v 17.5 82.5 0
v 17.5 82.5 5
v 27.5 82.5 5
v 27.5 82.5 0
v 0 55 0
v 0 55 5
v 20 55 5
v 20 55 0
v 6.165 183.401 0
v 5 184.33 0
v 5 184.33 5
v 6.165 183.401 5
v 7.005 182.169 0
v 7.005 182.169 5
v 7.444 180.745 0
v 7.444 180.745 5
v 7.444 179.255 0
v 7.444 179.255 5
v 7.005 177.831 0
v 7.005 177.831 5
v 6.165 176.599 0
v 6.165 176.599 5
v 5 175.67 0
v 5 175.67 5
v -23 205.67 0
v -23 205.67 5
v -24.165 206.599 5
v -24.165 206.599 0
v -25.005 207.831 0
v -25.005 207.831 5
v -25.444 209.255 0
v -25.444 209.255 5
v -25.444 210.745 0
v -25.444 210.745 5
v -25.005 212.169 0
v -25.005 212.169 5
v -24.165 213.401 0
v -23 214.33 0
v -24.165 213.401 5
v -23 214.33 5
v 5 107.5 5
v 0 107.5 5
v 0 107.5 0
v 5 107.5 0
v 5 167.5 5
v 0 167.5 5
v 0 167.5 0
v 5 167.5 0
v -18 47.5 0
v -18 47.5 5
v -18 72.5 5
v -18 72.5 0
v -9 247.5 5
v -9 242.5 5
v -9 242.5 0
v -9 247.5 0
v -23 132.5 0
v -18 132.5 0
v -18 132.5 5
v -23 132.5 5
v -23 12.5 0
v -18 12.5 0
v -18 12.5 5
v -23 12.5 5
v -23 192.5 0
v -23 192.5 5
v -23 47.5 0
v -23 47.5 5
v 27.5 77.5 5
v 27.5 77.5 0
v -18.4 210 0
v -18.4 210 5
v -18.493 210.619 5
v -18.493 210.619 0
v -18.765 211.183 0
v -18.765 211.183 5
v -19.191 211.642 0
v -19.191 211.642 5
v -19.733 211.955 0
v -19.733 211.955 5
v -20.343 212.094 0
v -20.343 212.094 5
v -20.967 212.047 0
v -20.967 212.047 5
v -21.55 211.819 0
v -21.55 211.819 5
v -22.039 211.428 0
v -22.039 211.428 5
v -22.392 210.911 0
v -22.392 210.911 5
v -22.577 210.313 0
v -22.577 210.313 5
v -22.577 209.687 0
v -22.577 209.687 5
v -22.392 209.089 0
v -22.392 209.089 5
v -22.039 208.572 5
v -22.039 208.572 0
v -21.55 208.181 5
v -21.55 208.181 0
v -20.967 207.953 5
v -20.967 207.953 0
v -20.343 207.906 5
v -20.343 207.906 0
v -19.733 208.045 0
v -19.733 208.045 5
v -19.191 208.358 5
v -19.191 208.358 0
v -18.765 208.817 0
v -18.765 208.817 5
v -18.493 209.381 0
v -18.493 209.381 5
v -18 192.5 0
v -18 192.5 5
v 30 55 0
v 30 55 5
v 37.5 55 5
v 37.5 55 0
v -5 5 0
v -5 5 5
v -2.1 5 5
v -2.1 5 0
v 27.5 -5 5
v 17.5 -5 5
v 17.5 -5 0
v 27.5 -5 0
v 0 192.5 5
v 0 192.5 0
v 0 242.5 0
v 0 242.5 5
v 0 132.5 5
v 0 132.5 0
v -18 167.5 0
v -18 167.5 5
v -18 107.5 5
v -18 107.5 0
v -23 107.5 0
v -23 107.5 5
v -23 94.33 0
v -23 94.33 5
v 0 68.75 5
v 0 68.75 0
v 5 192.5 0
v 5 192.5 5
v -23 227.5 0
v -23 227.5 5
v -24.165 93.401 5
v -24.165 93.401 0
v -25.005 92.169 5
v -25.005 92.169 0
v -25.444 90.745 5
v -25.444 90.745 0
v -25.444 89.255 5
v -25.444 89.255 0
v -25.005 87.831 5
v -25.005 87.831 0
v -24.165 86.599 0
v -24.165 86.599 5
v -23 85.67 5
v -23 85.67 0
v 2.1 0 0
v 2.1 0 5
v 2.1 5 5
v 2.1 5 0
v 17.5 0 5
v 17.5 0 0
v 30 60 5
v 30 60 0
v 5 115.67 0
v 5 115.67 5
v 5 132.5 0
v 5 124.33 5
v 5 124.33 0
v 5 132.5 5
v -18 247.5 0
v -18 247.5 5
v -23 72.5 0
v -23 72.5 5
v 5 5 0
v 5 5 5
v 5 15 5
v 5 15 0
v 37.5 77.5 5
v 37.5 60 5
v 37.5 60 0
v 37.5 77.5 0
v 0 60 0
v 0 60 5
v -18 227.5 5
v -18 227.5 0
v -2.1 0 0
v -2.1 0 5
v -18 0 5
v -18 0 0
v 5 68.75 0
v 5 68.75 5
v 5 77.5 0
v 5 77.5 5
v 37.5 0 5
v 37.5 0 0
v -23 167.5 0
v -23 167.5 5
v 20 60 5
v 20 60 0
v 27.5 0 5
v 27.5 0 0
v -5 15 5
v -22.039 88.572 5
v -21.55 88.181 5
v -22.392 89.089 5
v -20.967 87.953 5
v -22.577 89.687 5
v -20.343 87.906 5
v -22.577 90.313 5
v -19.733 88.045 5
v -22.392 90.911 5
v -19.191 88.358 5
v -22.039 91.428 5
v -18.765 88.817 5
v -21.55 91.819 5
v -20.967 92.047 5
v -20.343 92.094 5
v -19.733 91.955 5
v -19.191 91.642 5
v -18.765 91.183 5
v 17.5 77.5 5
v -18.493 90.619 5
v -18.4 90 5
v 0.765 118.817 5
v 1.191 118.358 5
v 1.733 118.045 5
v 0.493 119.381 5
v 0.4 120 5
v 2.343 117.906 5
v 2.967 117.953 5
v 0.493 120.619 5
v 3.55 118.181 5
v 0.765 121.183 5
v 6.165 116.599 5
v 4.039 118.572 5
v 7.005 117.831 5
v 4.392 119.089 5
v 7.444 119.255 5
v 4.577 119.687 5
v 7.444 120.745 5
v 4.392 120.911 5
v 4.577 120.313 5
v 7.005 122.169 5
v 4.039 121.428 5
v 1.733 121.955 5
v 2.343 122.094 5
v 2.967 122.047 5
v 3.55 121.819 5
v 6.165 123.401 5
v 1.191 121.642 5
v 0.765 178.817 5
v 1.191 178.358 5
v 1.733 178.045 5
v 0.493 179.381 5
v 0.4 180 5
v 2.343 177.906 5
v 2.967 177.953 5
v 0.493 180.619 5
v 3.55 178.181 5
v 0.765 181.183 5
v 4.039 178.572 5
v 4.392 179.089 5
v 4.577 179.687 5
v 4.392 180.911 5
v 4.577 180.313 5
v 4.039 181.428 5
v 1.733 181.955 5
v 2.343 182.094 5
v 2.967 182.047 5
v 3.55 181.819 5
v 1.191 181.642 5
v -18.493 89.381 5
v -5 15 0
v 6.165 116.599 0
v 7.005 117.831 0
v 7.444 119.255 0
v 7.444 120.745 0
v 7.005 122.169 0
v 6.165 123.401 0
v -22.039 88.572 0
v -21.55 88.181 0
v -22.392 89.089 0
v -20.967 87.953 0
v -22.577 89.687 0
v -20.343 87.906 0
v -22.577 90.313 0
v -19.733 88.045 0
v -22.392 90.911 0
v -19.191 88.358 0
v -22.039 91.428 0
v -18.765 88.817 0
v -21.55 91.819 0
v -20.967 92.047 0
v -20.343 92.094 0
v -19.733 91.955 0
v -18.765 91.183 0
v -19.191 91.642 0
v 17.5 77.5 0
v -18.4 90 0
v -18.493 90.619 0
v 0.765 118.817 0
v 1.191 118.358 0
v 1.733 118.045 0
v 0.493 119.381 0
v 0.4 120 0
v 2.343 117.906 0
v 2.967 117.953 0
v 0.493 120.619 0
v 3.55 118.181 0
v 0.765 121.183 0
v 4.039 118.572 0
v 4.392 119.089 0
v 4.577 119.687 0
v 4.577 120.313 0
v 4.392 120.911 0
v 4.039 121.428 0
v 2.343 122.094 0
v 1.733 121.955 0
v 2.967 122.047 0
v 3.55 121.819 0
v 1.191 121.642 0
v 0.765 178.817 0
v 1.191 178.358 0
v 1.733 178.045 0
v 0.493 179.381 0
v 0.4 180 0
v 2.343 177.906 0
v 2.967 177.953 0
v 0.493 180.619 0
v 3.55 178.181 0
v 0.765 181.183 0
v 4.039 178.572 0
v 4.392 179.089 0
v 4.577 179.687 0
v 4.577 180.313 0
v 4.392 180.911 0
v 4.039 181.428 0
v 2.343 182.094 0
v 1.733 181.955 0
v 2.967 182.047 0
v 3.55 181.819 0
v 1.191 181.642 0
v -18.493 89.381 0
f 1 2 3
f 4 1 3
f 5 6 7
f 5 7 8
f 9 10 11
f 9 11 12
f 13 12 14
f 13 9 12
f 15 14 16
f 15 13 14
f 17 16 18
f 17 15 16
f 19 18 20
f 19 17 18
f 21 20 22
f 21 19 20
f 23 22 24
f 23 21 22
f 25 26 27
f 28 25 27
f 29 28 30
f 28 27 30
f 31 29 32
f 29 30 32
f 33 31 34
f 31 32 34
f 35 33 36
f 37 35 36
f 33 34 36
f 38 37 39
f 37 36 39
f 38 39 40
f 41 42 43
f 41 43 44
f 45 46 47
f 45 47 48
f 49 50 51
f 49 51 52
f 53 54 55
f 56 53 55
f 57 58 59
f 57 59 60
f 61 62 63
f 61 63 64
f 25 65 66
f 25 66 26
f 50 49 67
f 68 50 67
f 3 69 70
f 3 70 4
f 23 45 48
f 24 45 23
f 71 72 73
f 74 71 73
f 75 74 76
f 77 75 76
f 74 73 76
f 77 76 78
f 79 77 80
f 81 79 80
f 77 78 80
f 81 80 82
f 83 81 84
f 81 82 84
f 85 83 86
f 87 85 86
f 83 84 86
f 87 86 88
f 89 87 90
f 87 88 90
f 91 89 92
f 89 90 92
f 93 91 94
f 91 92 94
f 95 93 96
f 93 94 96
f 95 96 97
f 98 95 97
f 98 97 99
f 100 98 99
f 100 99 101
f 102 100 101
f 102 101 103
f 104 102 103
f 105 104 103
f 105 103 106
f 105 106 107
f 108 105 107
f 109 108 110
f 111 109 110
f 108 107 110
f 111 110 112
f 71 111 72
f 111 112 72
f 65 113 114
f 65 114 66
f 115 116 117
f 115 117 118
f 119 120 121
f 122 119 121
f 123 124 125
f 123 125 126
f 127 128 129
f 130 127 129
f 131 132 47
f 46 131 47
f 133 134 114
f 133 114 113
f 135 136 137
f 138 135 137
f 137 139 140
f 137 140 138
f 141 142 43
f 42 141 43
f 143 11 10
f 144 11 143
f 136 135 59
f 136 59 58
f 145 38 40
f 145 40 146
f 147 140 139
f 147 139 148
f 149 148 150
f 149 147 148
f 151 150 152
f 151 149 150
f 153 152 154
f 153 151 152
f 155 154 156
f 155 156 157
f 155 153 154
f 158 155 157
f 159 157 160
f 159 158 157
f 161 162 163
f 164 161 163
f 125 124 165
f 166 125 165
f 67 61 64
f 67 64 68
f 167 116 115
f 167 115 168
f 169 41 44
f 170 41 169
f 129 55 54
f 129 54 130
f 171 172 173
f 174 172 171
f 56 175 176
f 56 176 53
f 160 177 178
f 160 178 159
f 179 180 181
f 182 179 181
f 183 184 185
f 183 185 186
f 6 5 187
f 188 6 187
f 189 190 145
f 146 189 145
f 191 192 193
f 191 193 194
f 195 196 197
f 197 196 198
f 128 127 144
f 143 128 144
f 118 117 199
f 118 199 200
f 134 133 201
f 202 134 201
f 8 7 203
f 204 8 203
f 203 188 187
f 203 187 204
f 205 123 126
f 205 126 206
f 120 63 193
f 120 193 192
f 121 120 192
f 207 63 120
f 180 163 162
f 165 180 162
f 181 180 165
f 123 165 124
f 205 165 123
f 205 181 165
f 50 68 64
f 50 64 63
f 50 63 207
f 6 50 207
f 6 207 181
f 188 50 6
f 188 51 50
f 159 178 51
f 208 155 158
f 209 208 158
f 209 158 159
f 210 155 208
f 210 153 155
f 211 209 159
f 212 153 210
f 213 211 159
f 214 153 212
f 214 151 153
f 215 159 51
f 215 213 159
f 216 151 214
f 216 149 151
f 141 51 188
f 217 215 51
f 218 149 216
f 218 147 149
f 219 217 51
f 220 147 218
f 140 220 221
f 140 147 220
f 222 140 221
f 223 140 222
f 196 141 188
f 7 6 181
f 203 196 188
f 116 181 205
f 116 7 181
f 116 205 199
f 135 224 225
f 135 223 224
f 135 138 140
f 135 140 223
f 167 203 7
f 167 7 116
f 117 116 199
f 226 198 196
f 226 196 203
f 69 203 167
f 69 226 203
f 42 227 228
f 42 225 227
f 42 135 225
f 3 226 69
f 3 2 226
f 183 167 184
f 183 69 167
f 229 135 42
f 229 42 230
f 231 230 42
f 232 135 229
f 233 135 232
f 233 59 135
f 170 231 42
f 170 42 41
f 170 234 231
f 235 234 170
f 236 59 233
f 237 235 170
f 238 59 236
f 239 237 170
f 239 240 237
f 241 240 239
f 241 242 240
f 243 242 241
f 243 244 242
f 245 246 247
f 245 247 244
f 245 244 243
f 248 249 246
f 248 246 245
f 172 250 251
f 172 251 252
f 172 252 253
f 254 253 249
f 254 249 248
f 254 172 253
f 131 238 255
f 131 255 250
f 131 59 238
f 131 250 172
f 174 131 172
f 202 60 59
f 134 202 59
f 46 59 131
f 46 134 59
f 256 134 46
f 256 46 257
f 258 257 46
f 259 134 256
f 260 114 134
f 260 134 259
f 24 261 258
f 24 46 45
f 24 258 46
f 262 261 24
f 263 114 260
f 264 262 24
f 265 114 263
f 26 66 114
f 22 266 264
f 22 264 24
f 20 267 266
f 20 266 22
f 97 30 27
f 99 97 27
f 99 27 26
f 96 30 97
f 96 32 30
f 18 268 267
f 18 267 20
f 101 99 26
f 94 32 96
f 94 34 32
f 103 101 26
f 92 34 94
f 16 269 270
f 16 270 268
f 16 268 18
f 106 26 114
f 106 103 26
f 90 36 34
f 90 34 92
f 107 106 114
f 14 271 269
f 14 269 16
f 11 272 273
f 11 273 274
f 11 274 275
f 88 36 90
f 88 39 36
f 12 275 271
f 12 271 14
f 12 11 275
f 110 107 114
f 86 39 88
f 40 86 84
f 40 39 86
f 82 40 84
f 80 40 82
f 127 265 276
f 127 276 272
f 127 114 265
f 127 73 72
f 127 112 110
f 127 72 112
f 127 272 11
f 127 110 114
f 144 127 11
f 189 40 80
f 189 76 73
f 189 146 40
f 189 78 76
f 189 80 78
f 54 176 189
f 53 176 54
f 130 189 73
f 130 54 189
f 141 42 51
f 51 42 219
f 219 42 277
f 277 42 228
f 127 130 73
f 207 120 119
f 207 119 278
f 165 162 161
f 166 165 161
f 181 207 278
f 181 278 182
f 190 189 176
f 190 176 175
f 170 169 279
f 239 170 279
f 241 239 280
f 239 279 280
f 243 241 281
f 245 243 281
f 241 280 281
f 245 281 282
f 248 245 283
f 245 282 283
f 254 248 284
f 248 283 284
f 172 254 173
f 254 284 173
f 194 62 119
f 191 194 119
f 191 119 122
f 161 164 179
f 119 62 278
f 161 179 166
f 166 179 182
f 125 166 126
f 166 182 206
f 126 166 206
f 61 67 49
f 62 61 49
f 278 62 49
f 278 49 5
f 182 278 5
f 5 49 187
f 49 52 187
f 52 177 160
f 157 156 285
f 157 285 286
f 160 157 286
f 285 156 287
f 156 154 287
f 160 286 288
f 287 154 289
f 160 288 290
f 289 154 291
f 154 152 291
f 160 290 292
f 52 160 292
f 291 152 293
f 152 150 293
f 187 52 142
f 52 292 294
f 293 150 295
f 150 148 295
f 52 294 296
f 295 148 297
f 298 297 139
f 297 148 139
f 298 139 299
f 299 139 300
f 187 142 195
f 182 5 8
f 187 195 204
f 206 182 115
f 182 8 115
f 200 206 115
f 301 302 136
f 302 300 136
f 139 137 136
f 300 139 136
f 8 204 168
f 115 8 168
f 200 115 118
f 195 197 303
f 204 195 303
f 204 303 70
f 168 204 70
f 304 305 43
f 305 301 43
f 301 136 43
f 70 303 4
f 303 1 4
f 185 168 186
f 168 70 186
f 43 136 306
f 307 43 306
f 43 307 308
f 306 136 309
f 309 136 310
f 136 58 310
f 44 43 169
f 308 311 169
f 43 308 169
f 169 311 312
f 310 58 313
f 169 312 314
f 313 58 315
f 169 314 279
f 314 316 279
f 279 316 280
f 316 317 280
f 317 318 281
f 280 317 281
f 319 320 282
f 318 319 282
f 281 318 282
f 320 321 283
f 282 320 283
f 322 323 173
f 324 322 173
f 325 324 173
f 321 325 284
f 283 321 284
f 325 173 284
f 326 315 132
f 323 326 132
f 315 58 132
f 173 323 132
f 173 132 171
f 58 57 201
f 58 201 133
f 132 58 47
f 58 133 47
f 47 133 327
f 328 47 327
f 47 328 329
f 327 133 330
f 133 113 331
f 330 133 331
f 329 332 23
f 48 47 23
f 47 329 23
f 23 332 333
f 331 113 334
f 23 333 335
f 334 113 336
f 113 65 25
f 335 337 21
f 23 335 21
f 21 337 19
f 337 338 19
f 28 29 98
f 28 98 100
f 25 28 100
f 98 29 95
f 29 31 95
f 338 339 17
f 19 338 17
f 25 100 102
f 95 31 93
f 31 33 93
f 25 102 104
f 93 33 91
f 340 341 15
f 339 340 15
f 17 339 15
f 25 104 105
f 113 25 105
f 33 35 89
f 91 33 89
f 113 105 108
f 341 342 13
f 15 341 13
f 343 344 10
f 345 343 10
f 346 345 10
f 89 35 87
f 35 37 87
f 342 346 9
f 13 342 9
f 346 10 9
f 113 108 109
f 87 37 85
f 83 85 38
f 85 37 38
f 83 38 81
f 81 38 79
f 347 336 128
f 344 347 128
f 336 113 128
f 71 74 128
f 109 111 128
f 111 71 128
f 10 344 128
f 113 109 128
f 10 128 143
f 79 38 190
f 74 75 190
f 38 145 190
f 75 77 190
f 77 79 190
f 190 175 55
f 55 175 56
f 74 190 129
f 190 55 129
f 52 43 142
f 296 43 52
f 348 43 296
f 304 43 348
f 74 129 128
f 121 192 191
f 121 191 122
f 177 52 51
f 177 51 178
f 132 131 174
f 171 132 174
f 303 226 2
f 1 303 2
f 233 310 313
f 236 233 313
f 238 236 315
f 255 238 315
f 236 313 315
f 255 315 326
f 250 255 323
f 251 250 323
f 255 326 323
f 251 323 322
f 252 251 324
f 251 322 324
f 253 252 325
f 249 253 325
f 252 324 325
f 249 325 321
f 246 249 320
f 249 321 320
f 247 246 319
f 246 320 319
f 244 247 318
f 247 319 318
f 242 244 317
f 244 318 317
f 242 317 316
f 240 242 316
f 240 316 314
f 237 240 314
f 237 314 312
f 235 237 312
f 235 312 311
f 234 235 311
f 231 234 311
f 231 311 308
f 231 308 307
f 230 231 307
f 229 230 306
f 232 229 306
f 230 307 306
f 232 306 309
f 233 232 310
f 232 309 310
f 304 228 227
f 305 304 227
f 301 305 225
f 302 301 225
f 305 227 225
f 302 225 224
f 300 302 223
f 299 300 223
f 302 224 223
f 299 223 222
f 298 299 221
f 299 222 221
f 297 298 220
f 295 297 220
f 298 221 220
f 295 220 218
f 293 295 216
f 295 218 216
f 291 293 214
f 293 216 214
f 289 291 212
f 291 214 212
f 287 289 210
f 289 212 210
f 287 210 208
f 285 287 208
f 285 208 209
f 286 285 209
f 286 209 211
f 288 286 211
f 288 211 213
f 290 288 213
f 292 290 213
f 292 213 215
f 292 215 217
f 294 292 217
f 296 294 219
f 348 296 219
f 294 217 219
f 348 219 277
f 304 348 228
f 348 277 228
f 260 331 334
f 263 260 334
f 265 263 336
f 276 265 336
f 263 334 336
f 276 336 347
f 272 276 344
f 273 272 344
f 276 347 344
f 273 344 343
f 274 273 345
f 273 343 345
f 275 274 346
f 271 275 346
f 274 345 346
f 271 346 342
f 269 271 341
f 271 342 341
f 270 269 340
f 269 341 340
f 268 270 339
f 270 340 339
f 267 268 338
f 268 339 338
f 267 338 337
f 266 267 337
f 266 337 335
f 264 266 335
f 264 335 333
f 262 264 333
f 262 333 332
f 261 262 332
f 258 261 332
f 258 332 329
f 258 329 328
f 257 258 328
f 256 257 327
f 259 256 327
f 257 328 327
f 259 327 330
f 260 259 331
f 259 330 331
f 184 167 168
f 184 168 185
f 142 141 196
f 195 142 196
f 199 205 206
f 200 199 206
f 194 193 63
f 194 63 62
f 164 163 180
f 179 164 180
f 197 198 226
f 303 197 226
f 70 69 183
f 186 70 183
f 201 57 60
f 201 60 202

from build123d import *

# Parameters (mm, degrees)
SKETCH1_W            = 18
SKETCH1_H            = 242.5
BOSS_EXTRUDE2_DEPTH  = 5
SKETCH2_W            = 9
SKETCH2_H            = 5
BOSS_EXTRUDE3_DEPTH  = 5
SKETCH3_W            = 5
SKETCH3_H            = 35
BOSS_EXTRUDE4_DEPTH  = 5
SKETCH4_W            = 5
SKETCH4_H            = 25
BOSS_EXTRUDE5_DEPTH  = 5
SKETCH5_W            = 5
SKETCH5_H            = 55
BOSS_EXTRUDE6_DEPTH  = 37.5
SKETCH6_W            = 10
SKETCH6_H            = 5
BOSS_EXTRUDE7_DEPTH  = 5
SKETCH7_W            = 5
SKETCH7_H            = 8.75
BOSS_EXTRUDE8_DEPTH  = 5
SKETCH8_W            = 10
SKETCH8_H            = 5
BOSS_EXTRUDE9_DEPTH  = 5
SKETCH9_W            = 32.5
SKETCH9_H            = 17.5
BOSS_EXTRUDE10_DEPTH = 5
SKETCH10_W           = 10
SKETCH10_H           = 5
BOSS_EXTRUDE11_DEPTH = 5
SKETCH11_R           = 2.1
CUT_EXTRUDE1_DEPTH   = 5
BOSS_EXTRUDE12_DEPTH = 5
SKETCH13_R           = 2.1
CUT_EXTRUDE2_DEPTH   = 5
BOSS_EXTRUDE13_DEPTH = 5
SKETCH15_W           = 4.2
SKETCH15_H           = 5
SKETCH15_W_2         = 10
SKETCH15_H_2         = 10
CUT_EXTRUDE3_DEPTH   = 10


with BuildPart() as part:
    # Sketch1 → Boss-Extrude2 (new body)
    with BuildSketch(Plane.XY):
        with Locations((-9, 121.25)):
            Rectangle(SKETCH1_W, SKETCH1_H)
    extrude(amount=BOSS_EXTRUDE2_DEPTH)

    # Sketch2 → Boss-Extrude3 (add)
    with BuildSketch(Plane(origin=(0, 242.5, 0), x_dir=(1, 0, 0), z_dir=(0, 1, 0))):
        with Locations((-13.5, -2.5)):
            Rectangle(SKETCH2_W, SKETCH2_H)
    extrude(amount=BOSS_EXTRUDE3_DEPTH)

    # Sketch3 → Boss-Extrude4 (add)
    with BuildSketch(Plane(origin=(0, 0, 0), x_dir=(-1, 0, 0), z_dir=(0, 0, -1))):
        with Locations((20.5, 210)):
            Rectangle(SKETCH3_W, SKETCH3_H)
        with Locations((20.5, 150)):
            Rectangle(SKETCH3_W, SKETCH3_H)
        with Locations((20.5, 90)):
            Rectangle(SKETCH3_W, SKETCH3_H)
        with Locations((20.5, 30)):
            Rectangle(SKETCH3_W, SKETCH3_H)
    extrude(amount=-BOSS_EXTRUDE4_DEPTH)

    # Sketch4 → Boss-Extrude5 (add)
    with BuildSketch(Plane.XY.offset(5)):
        with Locations((2.5, 180)):
            Rectangle(SKETCH4_W, SKETCH4_H)
        with Locations((2.5, 120)):
            Rectangle(SKETCH4_W, SKETCH4_H)
    extrude(amount=-BOSS_EXTRUDE5_DEPTH)

    # Sketch5 → Boss-Extrude6 (add)
    with BuildSketch(Plane(origin=(0, 0, 0), x_dir=(0, 0, -1), z_dir=(1, 0, 0))):
        with Locations((-2.5, 27.5)):
            Rectangle(SKETCH5_W, SKETCH5_H)
    extrude(amount=BOSS_EXTRUDE6_DEPTH)

    # Sketch6 → Boss-Extrude7 (add)
    with BuildSketch(Plane.XY.offset(5)):
        with Locations((25, 57.5)):
            Rectangle(SKETCH6_W, SKETCH6_H)
    extrude(amount=-BOSS_EXTRUDE7_DEPTH)

    # Sketch7 → Boss-Extrude8 (add)
    with BuildSketch(Plane.XY.offset(5)):
        with Locations((2.5, 64.375)):
            Rectangle(SKETCH7_W, SKETCH7_H)
    extrude(amount=-BOSS_EXTRUDE8_DEPTH)

    # Sketch8 → Boss-Extrude9 (add)
    with BuildSketch(Plane.XY.offset(5)):
        with Locations((22.5, -2.5)):
            Rectangle(SKETCH8_W, SKETCH8_H)
    extrude(amount=-BOSS_EXTRUDE9_DEPTH)

    # Sketch9 → Boss-Extrude10 (add)
    with BuildSketch(Plane.XY.offset(5)):
        with Locations((21.25, 68.75)):
            Rectangle(SKETCH9_W, SKETCH9_H)
    extrude(amount=-BOSS_EXTRUDE10_DEPTH)

    # Sketch10 → Boss-Extrude11 (add)
    with BuildSketch(Plane.XY.offset(5)):
        with Locations((22.5, 80)):
            Rectangle(SKETCH10_W, SKETCH10_H)
    extrude(amount=-BOSS_EXTRUDE11_DEPTH)

    # Sketch11 → Cut-Extrude1 (cut)
    with BuildSketch(Plane(origin=(0, 0, 0), x_dir=(-1, 0, 0), z_dir=(0, 0, -1))):
        with Locations((-2.5, 180)):
            Circle(SKETCH11_R)
        with Locations((-2.5, 120)):
            Circle(SKETCH11_R)
    extrude(amount=-CUT_EXTRUDE1_DEPTH, mode=Mode.SUBTRACT)

    # Sketch12 → Boss-Extrude12 (add)
    with BuildSketch(Plane(origin=(0, 0, 0), x_dir=(-1, 0, 0), z_dir=(0, 0, -1))):
        with BuildLine():
            Line((-5, 175.669872981), (-5, 184.330127019))
            ThreePointArc((-5, 184.330127019), (-7.5, 180), (-5, 175.669872981))
        make_face()
        with BuildLine():
            Line((-5, 124.330127019), (-5, 115.669872981))
            ThreePointArc((-5, 115.669872981), (-7.5, 120), (-5, 124.330127019))
        make_face()
    extrude(amount=-BOSS_EXTRUDE12_DEPTH)

    # Sketch13 → Cut-Extrude2 (cut)
    with BuildSketch(Plane.XY.offset(5)):
        with Locations((-20.5, 210)):
            Circle(SKETCH13_R)
        with Locations((-20.5, 90)):
            Circle(SKETCH13_R)
    extrude(amount=-CUT_EXTRUDE2_DEPTH, mode=Mode.SUBTRACT)

    # Sketch14 → Boss-Extrude13 (add)
    with BuildSketch(Plane.XY.offset(5)):
        with BuildLine():
            Line((-23, 214.330127019), (-23, 205.669872981))
            ThreePointArc((-23, 205.669872981), (-25.5, 210), (-23, 214.330127019))
        make_face()
        with BuildLine():
            Line((-23, 85.669872981), (-23, 94.330127019))
            ThreePointArc((-23, 94.330127019), (-25.5, 90), (-23, 85.669872981))
        make_face()
    extrude(amount=-BOSS_EXTRUDE13_DEPTH)

    # Sketch15 → Cut-Extrude3 (cut)
    with BuildSketch(Plane.XY.offset(5)):
        with Locations((0, 2.5)):
            Rectangle(SKETCH15_W, SKETCH15_H)
        with Locations((0, 10)):
            Rectangle(SKETCH15_W_2, SKETCH15_H_2)
    extrude(amount=-CUT_EXTRUDE3_DEPTH, mode=Mode.SUBTRACT)


solid = part.part
